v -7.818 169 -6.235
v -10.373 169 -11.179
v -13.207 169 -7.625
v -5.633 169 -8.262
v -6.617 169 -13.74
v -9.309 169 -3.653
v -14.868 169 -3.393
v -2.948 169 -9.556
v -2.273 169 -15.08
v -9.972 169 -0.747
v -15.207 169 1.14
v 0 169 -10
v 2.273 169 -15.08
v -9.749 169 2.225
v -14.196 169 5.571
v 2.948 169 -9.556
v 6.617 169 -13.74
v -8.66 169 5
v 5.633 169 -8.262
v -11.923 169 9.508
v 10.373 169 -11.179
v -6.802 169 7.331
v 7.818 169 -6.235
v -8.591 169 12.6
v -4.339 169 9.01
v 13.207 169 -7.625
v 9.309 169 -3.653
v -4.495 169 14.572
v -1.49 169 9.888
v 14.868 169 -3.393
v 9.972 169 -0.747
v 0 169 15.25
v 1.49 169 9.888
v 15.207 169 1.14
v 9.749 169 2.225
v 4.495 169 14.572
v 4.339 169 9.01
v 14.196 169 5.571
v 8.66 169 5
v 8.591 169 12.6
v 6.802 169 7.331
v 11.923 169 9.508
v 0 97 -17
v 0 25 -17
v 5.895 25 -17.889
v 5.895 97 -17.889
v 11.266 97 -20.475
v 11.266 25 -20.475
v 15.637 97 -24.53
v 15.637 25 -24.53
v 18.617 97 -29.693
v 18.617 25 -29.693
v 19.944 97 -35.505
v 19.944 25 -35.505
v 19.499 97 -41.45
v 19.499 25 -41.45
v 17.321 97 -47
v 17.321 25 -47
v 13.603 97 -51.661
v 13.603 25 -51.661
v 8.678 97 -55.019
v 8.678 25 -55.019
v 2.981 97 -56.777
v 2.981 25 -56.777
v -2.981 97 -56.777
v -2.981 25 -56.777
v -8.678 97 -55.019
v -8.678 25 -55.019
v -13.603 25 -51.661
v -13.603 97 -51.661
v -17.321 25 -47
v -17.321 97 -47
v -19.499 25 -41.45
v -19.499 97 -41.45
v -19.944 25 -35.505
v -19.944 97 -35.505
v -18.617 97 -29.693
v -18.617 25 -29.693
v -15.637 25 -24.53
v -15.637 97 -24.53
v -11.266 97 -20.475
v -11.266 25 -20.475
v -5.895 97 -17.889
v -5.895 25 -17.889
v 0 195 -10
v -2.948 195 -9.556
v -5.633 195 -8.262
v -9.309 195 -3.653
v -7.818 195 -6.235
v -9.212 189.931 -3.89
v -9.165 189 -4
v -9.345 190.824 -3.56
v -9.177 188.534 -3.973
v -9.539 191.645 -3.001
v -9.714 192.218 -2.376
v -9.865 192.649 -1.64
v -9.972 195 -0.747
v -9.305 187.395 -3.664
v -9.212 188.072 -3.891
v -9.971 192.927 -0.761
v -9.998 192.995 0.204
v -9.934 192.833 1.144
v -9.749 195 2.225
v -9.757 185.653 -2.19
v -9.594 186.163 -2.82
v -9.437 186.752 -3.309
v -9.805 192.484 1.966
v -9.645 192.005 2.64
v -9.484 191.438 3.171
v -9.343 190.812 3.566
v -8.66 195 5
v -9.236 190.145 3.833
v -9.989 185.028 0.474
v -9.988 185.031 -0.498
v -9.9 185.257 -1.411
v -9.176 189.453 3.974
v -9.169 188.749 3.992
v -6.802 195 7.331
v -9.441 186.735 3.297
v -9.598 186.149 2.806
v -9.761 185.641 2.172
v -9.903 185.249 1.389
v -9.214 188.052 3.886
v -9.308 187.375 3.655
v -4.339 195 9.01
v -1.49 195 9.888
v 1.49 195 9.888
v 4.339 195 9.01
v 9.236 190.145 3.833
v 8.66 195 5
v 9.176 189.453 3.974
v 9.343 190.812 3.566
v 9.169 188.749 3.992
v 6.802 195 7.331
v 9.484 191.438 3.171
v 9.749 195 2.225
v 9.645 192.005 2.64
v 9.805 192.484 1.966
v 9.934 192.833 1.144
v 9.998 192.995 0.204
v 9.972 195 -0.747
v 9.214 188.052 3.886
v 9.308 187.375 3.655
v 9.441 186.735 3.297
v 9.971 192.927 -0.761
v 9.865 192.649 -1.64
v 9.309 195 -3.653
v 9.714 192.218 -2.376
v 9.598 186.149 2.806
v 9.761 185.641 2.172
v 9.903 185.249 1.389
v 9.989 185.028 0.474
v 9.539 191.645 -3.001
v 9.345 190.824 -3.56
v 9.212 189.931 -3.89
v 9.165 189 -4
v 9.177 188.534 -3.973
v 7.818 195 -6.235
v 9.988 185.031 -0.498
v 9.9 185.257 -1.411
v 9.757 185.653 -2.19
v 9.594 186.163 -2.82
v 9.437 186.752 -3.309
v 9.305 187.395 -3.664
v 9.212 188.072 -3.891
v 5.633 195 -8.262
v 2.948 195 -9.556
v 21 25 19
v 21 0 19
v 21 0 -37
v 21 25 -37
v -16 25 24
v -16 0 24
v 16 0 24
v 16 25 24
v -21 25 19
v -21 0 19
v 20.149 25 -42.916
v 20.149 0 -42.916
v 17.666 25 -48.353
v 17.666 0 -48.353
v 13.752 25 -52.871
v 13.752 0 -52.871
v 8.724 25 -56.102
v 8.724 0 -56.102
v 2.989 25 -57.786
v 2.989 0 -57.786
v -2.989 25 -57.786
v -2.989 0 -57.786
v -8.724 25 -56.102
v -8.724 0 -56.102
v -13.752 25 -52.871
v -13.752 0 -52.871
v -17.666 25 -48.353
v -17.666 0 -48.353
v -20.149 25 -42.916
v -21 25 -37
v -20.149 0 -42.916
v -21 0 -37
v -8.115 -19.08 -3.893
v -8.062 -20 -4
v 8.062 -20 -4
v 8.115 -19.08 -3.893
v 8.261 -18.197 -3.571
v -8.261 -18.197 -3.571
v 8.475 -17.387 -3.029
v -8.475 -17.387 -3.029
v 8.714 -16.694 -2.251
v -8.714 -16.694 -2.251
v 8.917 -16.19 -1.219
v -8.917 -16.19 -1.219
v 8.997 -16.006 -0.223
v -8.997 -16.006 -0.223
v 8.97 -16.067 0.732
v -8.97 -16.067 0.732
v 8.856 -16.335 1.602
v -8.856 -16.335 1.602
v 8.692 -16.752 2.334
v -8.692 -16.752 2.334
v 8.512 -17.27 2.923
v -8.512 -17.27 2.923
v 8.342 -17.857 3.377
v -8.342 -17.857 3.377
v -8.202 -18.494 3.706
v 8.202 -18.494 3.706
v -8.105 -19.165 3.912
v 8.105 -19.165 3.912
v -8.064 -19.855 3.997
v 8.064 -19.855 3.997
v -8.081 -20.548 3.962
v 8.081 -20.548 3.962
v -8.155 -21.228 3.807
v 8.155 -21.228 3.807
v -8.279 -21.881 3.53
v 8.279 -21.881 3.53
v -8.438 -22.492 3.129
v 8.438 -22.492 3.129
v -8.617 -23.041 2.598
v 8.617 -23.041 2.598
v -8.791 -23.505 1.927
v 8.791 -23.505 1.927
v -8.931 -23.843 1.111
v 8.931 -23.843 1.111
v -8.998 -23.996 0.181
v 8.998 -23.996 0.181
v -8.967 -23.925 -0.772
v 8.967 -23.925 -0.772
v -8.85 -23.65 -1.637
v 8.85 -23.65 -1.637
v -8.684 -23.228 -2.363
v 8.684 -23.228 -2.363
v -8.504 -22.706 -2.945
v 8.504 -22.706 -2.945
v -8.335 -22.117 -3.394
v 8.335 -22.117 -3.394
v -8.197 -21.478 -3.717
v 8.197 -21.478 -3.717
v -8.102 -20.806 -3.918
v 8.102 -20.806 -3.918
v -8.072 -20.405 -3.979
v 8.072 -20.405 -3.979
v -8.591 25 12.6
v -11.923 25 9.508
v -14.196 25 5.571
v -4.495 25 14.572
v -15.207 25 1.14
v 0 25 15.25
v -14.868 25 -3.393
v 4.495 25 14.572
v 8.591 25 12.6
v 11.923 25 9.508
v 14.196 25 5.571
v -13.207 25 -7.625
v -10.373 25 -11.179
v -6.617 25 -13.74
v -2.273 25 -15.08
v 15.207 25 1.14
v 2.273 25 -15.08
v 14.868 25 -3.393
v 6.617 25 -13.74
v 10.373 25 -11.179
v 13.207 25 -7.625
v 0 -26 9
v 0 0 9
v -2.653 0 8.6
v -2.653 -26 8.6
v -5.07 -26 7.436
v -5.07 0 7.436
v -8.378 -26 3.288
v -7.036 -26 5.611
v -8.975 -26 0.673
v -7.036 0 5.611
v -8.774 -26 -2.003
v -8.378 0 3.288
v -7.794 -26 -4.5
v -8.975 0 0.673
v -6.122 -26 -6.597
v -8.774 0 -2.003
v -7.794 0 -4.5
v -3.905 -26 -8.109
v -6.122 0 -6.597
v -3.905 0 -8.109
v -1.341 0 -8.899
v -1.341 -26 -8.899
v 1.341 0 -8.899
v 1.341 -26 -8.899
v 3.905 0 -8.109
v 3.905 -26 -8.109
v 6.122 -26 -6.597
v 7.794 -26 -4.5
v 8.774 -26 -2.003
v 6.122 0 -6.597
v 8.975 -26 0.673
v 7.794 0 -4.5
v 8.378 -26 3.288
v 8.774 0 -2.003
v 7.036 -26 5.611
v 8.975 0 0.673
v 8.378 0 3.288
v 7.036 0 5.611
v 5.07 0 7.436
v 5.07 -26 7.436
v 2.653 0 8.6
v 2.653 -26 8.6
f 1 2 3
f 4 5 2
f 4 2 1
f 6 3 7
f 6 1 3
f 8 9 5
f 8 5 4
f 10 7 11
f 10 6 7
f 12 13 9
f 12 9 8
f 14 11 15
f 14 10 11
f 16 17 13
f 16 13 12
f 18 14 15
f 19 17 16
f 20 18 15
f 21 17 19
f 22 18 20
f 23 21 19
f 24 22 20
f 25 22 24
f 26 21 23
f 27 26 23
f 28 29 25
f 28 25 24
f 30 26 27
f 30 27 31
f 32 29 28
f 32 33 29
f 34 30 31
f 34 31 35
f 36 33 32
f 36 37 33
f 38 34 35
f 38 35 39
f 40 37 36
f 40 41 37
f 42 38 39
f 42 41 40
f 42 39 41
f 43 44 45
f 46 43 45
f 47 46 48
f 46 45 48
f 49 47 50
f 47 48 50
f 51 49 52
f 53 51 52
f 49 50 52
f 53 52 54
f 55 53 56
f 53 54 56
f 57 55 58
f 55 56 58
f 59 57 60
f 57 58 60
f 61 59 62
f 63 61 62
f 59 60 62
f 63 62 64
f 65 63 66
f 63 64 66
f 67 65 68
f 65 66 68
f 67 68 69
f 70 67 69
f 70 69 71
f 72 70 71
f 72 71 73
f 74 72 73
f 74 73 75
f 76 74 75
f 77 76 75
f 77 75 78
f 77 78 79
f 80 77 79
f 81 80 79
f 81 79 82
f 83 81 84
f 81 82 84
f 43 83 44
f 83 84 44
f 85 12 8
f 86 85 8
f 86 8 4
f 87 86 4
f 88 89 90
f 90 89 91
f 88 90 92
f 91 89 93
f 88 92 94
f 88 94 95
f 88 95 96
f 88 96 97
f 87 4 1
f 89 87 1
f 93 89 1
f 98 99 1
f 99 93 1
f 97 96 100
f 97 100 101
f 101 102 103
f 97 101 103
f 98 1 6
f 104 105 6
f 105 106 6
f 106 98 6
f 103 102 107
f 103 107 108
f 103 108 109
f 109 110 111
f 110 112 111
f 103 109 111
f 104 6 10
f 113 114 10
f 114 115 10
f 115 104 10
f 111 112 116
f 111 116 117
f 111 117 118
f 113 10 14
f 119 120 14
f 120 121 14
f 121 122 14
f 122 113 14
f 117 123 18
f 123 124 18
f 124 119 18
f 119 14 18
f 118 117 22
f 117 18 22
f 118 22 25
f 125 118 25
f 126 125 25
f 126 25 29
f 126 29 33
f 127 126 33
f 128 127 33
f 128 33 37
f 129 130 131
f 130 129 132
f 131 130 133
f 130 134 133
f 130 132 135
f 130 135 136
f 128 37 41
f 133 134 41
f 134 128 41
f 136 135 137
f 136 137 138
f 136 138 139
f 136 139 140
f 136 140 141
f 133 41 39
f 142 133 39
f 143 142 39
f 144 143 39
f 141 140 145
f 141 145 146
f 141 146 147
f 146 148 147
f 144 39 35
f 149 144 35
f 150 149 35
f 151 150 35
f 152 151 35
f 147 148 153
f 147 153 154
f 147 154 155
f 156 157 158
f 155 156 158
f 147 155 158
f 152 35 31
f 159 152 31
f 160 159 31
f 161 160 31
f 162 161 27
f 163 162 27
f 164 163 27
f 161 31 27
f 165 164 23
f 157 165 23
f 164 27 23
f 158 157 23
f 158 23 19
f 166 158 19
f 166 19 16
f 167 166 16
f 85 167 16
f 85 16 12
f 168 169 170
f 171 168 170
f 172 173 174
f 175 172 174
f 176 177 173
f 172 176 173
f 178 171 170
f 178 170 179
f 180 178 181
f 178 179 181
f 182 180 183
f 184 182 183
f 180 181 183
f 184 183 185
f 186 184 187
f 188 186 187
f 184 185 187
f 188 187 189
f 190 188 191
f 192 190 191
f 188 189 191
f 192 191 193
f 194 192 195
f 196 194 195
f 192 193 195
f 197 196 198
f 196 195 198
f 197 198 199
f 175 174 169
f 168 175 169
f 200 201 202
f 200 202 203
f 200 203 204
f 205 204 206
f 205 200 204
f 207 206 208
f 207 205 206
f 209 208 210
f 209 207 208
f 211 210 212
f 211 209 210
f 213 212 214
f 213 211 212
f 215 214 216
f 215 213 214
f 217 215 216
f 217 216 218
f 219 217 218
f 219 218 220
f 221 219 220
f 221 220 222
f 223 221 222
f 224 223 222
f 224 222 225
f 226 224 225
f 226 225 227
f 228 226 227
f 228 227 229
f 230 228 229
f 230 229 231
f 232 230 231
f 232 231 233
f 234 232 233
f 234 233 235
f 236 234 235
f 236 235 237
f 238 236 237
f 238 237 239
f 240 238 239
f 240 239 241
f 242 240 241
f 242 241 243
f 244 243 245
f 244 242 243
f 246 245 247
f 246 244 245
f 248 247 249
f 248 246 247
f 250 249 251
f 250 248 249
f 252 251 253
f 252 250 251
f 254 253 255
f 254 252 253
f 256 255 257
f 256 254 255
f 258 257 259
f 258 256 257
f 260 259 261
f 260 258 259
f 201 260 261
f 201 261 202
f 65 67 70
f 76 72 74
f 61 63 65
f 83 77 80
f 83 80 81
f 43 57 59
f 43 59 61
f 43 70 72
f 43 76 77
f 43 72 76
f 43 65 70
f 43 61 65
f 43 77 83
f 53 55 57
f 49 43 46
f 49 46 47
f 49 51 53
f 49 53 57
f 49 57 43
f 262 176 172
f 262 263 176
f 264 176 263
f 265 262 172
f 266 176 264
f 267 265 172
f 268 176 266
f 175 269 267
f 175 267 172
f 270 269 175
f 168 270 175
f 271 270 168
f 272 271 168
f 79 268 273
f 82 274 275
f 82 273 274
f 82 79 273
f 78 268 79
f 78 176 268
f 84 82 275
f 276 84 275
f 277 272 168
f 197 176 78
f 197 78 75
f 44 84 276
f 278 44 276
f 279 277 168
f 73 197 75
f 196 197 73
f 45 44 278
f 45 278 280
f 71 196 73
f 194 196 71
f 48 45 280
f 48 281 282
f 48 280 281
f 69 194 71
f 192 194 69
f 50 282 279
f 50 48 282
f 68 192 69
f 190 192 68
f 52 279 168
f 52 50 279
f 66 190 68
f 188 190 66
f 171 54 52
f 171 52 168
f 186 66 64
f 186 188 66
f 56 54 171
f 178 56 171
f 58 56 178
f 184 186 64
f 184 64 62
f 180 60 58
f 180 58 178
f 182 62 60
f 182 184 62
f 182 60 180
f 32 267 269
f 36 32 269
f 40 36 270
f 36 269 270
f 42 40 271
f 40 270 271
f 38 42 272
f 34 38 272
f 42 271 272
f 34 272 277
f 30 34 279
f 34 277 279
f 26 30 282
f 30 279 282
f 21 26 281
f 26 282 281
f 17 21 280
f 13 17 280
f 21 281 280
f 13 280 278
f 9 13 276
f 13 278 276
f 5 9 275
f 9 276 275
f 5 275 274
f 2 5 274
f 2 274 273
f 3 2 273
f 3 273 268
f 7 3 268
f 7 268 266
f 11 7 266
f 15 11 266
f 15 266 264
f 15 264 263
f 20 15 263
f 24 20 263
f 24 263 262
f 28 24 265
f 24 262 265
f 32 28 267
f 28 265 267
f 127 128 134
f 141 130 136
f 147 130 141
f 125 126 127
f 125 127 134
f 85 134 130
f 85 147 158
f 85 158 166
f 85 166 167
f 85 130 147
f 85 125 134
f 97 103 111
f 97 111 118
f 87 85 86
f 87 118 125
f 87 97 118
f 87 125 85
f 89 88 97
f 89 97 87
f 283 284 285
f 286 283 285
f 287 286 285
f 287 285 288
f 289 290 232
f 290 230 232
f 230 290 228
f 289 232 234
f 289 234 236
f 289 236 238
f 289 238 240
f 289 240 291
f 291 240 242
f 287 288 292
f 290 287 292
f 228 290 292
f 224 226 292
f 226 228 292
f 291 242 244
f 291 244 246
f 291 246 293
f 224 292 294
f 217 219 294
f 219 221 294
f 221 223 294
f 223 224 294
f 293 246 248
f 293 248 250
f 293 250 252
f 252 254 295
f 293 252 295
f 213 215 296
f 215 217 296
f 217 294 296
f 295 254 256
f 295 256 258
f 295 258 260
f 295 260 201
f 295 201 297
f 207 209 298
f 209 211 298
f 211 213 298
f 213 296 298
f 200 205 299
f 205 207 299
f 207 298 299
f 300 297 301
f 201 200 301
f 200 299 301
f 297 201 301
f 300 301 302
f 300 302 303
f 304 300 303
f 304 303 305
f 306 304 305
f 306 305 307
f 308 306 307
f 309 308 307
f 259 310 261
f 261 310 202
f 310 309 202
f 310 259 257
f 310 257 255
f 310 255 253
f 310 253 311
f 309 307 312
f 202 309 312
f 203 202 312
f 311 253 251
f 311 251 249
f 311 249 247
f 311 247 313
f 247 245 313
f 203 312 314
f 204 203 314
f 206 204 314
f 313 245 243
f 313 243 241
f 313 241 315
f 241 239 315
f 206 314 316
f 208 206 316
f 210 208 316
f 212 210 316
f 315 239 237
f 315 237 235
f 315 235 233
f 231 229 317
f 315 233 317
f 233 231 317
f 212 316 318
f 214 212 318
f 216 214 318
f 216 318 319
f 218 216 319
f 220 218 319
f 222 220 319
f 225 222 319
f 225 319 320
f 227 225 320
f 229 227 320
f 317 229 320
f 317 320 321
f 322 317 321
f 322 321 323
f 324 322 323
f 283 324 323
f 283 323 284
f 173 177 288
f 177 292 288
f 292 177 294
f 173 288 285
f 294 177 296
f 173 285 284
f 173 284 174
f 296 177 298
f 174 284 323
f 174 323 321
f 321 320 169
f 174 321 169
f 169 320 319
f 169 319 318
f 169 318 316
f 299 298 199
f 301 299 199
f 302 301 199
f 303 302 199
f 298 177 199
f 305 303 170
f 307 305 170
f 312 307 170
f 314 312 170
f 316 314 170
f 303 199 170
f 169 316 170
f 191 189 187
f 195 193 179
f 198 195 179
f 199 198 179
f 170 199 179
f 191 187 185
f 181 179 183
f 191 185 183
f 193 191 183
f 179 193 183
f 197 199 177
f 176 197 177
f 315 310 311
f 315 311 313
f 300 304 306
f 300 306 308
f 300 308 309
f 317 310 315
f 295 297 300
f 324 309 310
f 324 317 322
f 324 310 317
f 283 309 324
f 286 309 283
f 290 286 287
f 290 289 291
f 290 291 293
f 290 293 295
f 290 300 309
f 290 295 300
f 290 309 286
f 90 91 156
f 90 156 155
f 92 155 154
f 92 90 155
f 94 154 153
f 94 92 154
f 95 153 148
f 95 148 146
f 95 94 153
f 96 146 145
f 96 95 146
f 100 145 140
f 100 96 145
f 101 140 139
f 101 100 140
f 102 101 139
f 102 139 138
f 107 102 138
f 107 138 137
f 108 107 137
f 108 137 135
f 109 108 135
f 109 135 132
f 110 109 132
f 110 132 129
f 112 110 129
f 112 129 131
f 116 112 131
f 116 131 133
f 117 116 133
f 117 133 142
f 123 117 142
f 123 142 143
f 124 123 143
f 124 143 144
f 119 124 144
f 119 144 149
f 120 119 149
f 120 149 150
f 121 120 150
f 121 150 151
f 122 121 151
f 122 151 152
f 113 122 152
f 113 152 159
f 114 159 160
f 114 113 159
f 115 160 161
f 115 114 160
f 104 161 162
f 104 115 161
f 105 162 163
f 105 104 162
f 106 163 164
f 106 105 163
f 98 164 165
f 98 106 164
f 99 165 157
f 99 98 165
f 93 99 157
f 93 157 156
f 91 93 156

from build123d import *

# Parameters (mm, degrees)
BOSS_EXTRUDE1_DEPTH     = 25
SKETCH2_R               = 15.25
BOSS_EXTRUDE2_DEPTH     = 144
SKETCH3_R               = 20
BOSS_EXTRUDE3_DEPTH     = 72
SKETCH4_R               = 9
BOSS_EXTRUDE4_DEPTH     = 26
CUT_EXTRUDE1_DEPTH      = 180.905530765
CUT_EXTRUDE1_DEPTH_BACK = 180.905530765
SKETCH5_R               = 4
SKETCH6_R               = 10
BOSS_EXTRUDE5_DEPTH     = 26
CUT_EXTRUDE2_DEPTH      = 205.523837242
CUT_EXTRUDE2_DEPTH_BACK = 205.523837242
SKETCH7_R               = 4


with BuildPart() as part:
    # Sketch1 → Boss-Extrude1 (new body)
    with BuildSketch(Plane(origin=(0, 0, 0), x_dir=(1, 0, 0), z_dir=(0, 1, 0))):
        with BuildLine():
            Line((-16, -24), (16, -24))
            Line((16, -24), (21, -19))
            Line((21, -19), (21, 37))
            ThreePointArc((21, 37), (0, 58), (-21, 37))
            Line((-21, 37), (-21, -19))
            Line((-21, -19), (-16, -24))
        make_face()
    extrude(amount=BOSS_EXTRUDE1_DEPTH)

    # Sketch2 → Boss-Extrude2 (add)
    with BuildSketch(Plane(origin=(0, 25, 0), x_dir=(1, 0, 0), z_dir=(0, 1, 0))):
        with Locations(Location((0, 0, 0), (0, 0, 270))):
            Circle(SKETCH2_R)
    extrude(amount=BOSS_EXTRUDE2_DEPTH)

    # Sketch3 → Boss-Extrude3 (add)
    with BuildSketch(Plane(origin=(0, 25, 0), x_dir=(1, 0, 0), z_dir=(0, 1, 0))):
        with Locations(Location((0, 37, 0), (0, 0, 270))):
            Circle(SKETCH3_R)
    extrude(amount=BOSS_EXTRUDE3_DEPTH)

    # Sketch4 → Boss-Extrude4 (add)
    with BuildSketch(Plane.XZ):
        with Locations(Location((0, 0, 0), (0, 0, 90))):
            Circle(SKETCH4_R)
    extrude(amount=BOSS_EXTRUDE4_DEPTH)

    # Sketch5 → Cut-Extrude1 (cut, two sides: drawn at the far end of the back side and taken through both)
    with BuildSketch(Plane(origin=(0, 0, 0), x_dir=(0, 0, -1), z_dir=(1, 0, 0)).offset(-CUT_EXTRUDE1_DEPTH_BACK)):
        with Locations((0, -20)):
            Circle(SKETCH5_R)
    extrude(amount=CUT_EXTRUDE1_DEPTH + CUT_EXTRUDE1_DEPTH_BACK, mode=Mode.SUBTRACT)

    # Sketch6 → Boss-Extrude5 (add)
    with BuildSketch(Plane(origin=(0, 169, 0), x_dir=(1, 0, 0), z_dir=(0, 1, 0))):
        with Locations(Location((0, 0, 0), (0, 0, 90))):
            Circle(SKETCH6_R)
    extrude(amount=BOSS_EXTRUDE5_DEPTH)

    # Sketch7 → Cut-Extrude2 (cut, two sides: drawn at the far end of the back side and taken through both)
    with BuildSketch(Plane(origin=(0, 0, 0), x_dir=(0, 0, -1), z_dir=(1, 0, 0)).offset(-CUT_EXTRUDE2_DEPTH_BACK)):
        with Locations((0, 189)):
            Circle(SKETCH7_R)
    extrude(amount=CUT_EXTRUDE2_DEPTH + CUT_EXTRUDE2_DEPTH_BACK, mode=Mode.SUBTRACT)


solid = part.part
